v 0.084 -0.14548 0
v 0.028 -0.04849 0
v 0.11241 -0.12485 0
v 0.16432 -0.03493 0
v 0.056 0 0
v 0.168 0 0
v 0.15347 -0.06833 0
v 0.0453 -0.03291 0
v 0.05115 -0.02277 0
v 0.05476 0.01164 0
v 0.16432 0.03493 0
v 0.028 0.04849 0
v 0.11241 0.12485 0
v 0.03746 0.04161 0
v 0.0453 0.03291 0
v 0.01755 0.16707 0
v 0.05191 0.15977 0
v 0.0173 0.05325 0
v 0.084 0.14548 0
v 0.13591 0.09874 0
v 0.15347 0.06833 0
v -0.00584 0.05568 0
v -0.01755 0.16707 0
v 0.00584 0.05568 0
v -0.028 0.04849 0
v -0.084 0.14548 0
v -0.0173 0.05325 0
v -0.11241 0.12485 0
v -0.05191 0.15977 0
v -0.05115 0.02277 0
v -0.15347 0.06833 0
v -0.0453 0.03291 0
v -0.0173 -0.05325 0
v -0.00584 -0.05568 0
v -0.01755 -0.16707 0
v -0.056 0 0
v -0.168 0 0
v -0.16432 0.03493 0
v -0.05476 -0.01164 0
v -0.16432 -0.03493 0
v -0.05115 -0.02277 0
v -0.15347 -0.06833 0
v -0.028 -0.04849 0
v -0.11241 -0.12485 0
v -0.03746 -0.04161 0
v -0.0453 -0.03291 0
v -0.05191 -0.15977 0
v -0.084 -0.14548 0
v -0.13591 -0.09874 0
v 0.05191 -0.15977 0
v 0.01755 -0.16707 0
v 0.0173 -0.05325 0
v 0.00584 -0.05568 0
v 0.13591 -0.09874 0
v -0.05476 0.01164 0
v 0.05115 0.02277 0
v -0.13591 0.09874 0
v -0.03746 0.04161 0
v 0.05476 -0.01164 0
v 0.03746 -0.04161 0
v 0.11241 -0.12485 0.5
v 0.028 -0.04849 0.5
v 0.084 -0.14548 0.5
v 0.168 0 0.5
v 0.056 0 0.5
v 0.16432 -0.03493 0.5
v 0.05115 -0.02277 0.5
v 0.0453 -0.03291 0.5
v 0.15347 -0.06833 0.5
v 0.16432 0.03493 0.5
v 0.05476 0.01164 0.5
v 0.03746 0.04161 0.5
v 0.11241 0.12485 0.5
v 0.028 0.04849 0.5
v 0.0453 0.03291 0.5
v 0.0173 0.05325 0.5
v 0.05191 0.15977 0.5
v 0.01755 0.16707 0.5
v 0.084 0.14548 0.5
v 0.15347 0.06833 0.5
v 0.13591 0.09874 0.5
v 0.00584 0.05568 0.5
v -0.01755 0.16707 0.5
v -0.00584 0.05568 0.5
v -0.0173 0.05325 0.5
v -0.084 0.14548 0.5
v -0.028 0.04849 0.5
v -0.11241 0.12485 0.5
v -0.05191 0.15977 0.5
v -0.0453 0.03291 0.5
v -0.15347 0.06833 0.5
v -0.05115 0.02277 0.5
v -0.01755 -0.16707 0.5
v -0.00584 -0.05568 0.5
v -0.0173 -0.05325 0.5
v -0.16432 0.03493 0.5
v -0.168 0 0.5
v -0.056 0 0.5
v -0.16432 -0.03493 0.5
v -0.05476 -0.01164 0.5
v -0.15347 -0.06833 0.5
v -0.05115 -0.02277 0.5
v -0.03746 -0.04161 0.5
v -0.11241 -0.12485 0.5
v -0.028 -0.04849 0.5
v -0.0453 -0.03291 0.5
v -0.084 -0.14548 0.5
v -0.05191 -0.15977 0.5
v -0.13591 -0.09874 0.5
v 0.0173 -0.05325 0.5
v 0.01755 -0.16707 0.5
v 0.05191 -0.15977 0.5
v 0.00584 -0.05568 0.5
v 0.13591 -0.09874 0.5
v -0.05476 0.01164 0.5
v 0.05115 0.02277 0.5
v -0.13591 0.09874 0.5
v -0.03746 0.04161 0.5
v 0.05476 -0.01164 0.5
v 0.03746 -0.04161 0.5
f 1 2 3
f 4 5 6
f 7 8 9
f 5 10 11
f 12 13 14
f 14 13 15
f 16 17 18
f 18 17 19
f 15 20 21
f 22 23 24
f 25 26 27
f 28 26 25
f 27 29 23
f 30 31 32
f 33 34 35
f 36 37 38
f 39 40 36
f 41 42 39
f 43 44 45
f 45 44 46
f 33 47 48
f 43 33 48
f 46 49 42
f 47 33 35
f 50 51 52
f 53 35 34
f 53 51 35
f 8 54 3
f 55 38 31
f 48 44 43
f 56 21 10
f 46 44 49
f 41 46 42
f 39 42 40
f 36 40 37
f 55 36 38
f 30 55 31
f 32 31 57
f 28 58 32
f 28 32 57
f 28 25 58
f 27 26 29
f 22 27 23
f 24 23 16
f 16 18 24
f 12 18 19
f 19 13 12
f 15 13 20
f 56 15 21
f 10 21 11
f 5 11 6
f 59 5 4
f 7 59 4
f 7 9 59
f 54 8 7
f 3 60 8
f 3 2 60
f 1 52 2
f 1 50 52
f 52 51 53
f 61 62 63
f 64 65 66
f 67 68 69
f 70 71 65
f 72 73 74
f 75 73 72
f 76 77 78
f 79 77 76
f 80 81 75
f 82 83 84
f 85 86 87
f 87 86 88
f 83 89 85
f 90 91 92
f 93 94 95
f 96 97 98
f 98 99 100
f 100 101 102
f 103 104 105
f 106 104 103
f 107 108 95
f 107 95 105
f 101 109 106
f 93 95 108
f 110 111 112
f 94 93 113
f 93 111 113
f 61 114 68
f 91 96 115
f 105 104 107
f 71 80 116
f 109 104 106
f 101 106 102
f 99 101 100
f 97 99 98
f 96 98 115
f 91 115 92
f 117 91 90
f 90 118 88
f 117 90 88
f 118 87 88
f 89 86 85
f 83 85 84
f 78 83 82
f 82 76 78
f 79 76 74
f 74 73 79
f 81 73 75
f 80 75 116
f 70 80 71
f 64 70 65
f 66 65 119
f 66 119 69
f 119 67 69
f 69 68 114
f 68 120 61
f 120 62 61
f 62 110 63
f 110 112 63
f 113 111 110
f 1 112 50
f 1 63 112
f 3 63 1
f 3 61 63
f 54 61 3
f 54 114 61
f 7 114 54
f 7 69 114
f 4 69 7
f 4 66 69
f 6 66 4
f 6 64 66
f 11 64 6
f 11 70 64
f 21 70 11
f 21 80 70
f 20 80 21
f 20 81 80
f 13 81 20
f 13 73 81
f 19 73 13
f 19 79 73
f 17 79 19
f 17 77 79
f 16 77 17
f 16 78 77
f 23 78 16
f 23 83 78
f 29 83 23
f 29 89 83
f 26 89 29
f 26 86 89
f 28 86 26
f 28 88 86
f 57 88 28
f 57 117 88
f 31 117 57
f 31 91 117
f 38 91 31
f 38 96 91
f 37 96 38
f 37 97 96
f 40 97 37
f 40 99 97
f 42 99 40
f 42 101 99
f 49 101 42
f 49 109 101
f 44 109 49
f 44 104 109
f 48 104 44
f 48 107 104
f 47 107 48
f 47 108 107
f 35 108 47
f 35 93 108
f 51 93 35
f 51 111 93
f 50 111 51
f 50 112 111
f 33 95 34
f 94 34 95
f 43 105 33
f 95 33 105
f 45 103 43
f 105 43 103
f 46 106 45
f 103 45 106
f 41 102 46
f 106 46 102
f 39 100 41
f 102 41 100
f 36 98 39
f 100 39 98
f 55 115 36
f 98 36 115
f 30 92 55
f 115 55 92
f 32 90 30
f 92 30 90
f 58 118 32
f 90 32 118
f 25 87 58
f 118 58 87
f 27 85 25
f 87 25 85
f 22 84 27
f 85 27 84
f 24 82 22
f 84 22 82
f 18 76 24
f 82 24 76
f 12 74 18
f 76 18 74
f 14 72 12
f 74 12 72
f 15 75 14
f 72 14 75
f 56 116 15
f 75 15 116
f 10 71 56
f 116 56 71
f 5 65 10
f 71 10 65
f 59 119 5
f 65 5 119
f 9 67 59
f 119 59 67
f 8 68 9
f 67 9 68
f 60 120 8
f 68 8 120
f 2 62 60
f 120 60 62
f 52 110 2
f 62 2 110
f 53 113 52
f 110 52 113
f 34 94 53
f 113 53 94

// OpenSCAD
/* [Spacer] */

// Height of spacer
spacer_height = 0.5;   // [0.25 : 0.125 : 1]

// Standard screw diameter
screw_size = 0.1120;  // [0.112:#4, 0.125:#5, 0.138:#6, 0.164:#8, 0.19:#10, 0.216:#12, 0.25:1/4", 0.375:3/8"]

// Number of spacers
spacer_count = 1;   // [1:25]

// Separation factor
separation_factor = 1.25;   // [1: 0.05: 2]

//
// calculated values
//

// Diameter of spacer
spacer_diameter = screw_size * 3;

// Separation between spacers
separation = spacer_diameter * separation_factor;

/* [Hidden] */

$fs = 0.01;

// instantiate an array of spacer objects
columns = ceil(sqrt(spacer_count));
rows = ceil(spacer_count / columns);

for (row = [1 : rows]) {
    for (col = [1 : columns]) {
        count = (row - 1) * columns + col;

        if (count <= spacer_count) {
            translate([(col - 1) * separation, -(row - 1) * separation, 0])
                spacer(spacer_height, spacer_diameter, screw_size);
        }
    }
}


//
//
//
module spacer(height, dia, hole) {
    linear_extrude(height = height)
        difference() {
            circle(d = dia);
            circle(d = hole);
        }
}
